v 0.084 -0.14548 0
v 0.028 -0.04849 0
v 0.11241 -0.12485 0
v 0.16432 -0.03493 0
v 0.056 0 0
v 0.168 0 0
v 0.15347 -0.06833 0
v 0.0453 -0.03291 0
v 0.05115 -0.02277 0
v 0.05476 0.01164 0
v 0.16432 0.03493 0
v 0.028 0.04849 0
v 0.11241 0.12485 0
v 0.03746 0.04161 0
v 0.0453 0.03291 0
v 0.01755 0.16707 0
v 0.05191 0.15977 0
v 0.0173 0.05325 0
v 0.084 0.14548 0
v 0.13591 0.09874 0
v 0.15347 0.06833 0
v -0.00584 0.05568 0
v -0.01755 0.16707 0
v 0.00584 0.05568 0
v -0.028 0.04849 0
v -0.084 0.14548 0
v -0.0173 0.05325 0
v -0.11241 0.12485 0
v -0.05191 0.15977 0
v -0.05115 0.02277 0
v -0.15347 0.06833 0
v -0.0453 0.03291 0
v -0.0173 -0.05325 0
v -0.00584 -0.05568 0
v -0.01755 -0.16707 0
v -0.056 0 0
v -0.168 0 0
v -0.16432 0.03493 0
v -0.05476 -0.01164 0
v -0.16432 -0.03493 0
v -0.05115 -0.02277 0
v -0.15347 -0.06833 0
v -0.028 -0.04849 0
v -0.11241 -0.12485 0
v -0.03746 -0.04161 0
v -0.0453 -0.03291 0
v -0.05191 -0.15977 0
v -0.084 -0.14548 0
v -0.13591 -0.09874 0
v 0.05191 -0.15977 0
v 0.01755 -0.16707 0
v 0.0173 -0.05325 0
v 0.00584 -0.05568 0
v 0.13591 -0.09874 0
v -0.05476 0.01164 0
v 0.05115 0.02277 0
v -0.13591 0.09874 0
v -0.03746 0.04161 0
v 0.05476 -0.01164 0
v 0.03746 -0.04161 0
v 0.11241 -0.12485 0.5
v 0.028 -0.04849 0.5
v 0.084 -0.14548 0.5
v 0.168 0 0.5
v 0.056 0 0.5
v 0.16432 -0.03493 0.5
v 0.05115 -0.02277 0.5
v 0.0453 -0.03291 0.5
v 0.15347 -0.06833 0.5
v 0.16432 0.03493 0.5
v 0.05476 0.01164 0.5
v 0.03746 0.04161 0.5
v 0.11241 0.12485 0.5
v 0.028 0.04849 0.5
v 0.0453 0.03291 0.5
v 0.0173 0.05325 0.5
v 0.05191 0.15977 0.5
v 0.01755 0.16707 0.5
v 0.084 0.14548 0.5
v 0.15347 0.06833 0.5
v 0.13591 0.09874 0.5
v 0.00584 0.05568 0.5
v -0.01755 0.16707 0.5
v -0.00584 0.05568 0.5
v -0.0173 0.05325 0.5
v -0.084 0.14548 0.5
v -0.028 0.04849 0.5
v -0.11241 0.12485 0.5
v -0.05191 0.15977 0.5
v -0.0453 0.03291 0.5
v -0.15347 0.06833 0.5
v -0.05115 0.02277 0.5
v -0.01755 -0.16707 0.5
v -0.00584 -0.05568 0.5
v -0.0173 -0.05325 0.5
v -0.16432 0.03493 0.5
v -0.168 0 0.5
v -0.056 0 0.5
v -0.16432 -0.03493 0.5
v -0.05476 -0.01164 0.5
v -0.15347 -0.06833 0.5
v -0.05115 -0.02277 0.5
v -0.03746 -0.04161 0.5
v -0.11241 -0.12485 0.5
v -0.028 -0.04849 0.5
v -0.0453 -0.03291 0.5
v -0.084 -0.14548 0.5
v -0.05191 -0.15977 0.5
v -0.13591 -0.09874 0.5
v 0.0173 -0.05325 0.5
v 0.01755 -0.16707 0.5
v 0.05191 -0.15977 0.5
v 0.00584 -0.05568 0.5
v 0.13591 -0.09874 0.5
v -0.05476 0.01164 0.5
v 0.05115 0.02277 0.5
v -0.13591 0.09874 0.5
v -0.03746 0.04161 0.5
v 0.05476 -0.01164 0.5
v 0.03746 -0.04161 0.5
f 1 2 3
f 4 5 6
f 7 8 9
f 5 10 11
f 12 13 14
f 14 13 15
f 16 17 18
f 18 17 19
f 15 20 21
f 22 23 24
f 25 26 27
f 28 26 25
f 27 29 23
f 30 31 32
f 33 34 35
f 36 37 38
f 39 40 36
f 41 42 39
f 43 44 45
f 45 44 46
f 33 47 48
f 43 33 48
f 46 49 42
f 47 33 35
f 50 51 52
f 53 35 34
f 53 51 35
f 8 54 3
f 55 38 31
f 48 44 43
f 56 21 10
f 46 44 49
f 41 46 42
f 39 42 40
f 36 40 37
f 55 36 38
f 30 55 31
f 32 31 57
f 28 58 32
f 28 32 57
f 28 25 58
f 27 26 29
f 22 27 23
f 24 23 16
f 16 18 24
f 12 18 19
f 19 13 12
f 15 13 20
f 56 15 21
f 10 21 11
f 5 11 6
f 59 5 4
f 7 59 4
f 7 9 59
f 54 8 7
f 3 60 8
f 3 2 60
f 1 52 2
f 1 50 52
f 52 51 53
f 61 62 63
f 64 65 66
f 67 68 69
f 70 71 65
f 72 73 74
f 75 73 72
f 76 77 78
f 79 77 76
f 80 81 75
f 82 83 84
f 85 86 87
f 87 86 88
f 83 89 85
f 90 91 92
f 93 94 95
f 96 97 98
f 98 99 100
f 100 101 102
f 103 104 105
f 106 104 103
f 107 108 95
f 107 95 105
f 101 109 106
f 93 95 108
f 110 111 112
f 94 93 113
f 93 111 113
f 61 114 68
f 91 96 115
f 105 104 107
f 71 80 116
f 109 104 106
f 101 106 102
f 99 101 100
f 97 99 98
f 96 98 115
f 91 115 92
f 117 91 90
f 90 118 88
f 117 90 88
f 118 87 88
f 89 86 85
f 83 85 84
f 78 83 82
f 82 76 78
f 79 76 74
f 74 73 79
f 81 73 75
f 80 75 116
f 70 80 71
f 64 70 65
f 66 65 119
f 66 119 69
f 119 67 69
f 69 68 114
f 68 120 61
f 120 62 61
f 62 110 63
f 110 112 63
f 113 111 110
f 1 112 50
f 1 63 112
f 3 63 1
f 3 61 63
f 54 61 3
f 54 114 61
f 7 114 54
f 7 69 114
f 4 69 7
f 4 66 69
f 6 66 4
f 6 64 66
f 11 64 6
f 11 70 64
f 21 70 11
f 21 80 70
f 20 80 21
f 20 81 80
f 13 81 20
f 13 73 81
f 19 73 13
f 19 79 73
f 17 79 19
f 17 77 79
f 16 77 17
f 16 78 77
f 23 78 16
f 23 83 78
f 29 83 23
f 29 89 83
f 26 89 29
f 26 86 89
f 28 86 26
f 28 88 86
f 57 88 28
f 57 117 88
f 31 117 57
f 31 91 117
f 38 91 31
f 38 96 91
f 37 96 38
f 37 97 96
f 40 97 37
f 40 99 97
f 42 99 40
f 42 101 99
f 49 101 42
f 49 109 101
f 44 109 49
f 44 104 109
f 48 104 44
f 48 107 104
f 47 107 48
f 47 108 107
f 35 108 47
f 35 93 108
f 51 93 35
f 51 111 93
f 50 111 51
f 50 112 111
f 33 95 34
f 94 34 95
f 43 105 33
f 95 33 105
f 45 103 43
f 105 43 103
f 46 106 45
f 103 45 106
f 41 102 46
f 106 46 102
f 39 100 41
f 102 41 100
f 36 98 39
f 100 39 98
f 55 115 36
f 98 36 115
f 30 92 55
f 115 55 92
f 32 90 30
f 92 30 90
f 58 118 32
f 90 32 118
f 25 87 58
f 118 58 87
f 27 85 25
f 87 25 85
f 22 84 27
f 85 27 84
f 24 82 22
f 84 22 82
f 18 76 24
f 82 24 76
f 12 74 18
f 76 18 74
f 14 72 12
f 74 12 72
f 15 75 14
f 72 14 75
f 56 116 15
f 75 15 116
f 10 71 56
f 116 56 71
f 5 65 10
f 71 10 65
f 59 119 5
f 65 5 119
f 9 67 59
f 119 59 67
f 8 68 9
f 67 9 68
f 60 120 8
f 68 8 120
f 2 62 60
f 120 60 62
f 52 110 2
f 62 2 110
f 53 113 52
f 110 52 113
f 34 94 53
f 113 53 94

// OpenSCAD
/* [Spacer] */

// Height of spacer
spacer_height = 0.5;   // [0.25 : 0.125 : 1]

// Standard screw diameter
screw_size = 0.1120;  // [0.112:#4, 0.125:#5, 0.138:#6, 0.164:#8, 0.19:#10, 0.216:#12, 0.25:1/4", 0.375:3/8"]

// Number of spacers
spacer_count = 1;   // [1:25]

// Separation factor
separation_factor = 1.25;   // [1: 0.05: 2]

//
// calculated values
//

// Diameter of spacer
spacer_diameter = screw_size * 3;

// Separation between spacers
separation = spacer_diameter * separation_factor;

/* [Hidden] */

$fs = 0.01;

// instantiate an array of spacer objects
columns = ceil(sqrt(spacer_count));
rows = ceil(spacer_count / columns);

for (row = [1 : rows]) {
    for (col = [1 : columns]) {
        count = (row - 1) * columns + col;

        if (count <= spacer_count) {
            translate([(col - 1) * separation, -(row - 1) * separation, 0])
                spacer(spacer_height, spacer_diameter, screw_size);
        }
    }
}


//
//
//
module spacer(height, dia, hole) {
    linear_extrude(height = height)
        difference() {
            circle(d = dia);
            circle(d = hole);
        }
}
